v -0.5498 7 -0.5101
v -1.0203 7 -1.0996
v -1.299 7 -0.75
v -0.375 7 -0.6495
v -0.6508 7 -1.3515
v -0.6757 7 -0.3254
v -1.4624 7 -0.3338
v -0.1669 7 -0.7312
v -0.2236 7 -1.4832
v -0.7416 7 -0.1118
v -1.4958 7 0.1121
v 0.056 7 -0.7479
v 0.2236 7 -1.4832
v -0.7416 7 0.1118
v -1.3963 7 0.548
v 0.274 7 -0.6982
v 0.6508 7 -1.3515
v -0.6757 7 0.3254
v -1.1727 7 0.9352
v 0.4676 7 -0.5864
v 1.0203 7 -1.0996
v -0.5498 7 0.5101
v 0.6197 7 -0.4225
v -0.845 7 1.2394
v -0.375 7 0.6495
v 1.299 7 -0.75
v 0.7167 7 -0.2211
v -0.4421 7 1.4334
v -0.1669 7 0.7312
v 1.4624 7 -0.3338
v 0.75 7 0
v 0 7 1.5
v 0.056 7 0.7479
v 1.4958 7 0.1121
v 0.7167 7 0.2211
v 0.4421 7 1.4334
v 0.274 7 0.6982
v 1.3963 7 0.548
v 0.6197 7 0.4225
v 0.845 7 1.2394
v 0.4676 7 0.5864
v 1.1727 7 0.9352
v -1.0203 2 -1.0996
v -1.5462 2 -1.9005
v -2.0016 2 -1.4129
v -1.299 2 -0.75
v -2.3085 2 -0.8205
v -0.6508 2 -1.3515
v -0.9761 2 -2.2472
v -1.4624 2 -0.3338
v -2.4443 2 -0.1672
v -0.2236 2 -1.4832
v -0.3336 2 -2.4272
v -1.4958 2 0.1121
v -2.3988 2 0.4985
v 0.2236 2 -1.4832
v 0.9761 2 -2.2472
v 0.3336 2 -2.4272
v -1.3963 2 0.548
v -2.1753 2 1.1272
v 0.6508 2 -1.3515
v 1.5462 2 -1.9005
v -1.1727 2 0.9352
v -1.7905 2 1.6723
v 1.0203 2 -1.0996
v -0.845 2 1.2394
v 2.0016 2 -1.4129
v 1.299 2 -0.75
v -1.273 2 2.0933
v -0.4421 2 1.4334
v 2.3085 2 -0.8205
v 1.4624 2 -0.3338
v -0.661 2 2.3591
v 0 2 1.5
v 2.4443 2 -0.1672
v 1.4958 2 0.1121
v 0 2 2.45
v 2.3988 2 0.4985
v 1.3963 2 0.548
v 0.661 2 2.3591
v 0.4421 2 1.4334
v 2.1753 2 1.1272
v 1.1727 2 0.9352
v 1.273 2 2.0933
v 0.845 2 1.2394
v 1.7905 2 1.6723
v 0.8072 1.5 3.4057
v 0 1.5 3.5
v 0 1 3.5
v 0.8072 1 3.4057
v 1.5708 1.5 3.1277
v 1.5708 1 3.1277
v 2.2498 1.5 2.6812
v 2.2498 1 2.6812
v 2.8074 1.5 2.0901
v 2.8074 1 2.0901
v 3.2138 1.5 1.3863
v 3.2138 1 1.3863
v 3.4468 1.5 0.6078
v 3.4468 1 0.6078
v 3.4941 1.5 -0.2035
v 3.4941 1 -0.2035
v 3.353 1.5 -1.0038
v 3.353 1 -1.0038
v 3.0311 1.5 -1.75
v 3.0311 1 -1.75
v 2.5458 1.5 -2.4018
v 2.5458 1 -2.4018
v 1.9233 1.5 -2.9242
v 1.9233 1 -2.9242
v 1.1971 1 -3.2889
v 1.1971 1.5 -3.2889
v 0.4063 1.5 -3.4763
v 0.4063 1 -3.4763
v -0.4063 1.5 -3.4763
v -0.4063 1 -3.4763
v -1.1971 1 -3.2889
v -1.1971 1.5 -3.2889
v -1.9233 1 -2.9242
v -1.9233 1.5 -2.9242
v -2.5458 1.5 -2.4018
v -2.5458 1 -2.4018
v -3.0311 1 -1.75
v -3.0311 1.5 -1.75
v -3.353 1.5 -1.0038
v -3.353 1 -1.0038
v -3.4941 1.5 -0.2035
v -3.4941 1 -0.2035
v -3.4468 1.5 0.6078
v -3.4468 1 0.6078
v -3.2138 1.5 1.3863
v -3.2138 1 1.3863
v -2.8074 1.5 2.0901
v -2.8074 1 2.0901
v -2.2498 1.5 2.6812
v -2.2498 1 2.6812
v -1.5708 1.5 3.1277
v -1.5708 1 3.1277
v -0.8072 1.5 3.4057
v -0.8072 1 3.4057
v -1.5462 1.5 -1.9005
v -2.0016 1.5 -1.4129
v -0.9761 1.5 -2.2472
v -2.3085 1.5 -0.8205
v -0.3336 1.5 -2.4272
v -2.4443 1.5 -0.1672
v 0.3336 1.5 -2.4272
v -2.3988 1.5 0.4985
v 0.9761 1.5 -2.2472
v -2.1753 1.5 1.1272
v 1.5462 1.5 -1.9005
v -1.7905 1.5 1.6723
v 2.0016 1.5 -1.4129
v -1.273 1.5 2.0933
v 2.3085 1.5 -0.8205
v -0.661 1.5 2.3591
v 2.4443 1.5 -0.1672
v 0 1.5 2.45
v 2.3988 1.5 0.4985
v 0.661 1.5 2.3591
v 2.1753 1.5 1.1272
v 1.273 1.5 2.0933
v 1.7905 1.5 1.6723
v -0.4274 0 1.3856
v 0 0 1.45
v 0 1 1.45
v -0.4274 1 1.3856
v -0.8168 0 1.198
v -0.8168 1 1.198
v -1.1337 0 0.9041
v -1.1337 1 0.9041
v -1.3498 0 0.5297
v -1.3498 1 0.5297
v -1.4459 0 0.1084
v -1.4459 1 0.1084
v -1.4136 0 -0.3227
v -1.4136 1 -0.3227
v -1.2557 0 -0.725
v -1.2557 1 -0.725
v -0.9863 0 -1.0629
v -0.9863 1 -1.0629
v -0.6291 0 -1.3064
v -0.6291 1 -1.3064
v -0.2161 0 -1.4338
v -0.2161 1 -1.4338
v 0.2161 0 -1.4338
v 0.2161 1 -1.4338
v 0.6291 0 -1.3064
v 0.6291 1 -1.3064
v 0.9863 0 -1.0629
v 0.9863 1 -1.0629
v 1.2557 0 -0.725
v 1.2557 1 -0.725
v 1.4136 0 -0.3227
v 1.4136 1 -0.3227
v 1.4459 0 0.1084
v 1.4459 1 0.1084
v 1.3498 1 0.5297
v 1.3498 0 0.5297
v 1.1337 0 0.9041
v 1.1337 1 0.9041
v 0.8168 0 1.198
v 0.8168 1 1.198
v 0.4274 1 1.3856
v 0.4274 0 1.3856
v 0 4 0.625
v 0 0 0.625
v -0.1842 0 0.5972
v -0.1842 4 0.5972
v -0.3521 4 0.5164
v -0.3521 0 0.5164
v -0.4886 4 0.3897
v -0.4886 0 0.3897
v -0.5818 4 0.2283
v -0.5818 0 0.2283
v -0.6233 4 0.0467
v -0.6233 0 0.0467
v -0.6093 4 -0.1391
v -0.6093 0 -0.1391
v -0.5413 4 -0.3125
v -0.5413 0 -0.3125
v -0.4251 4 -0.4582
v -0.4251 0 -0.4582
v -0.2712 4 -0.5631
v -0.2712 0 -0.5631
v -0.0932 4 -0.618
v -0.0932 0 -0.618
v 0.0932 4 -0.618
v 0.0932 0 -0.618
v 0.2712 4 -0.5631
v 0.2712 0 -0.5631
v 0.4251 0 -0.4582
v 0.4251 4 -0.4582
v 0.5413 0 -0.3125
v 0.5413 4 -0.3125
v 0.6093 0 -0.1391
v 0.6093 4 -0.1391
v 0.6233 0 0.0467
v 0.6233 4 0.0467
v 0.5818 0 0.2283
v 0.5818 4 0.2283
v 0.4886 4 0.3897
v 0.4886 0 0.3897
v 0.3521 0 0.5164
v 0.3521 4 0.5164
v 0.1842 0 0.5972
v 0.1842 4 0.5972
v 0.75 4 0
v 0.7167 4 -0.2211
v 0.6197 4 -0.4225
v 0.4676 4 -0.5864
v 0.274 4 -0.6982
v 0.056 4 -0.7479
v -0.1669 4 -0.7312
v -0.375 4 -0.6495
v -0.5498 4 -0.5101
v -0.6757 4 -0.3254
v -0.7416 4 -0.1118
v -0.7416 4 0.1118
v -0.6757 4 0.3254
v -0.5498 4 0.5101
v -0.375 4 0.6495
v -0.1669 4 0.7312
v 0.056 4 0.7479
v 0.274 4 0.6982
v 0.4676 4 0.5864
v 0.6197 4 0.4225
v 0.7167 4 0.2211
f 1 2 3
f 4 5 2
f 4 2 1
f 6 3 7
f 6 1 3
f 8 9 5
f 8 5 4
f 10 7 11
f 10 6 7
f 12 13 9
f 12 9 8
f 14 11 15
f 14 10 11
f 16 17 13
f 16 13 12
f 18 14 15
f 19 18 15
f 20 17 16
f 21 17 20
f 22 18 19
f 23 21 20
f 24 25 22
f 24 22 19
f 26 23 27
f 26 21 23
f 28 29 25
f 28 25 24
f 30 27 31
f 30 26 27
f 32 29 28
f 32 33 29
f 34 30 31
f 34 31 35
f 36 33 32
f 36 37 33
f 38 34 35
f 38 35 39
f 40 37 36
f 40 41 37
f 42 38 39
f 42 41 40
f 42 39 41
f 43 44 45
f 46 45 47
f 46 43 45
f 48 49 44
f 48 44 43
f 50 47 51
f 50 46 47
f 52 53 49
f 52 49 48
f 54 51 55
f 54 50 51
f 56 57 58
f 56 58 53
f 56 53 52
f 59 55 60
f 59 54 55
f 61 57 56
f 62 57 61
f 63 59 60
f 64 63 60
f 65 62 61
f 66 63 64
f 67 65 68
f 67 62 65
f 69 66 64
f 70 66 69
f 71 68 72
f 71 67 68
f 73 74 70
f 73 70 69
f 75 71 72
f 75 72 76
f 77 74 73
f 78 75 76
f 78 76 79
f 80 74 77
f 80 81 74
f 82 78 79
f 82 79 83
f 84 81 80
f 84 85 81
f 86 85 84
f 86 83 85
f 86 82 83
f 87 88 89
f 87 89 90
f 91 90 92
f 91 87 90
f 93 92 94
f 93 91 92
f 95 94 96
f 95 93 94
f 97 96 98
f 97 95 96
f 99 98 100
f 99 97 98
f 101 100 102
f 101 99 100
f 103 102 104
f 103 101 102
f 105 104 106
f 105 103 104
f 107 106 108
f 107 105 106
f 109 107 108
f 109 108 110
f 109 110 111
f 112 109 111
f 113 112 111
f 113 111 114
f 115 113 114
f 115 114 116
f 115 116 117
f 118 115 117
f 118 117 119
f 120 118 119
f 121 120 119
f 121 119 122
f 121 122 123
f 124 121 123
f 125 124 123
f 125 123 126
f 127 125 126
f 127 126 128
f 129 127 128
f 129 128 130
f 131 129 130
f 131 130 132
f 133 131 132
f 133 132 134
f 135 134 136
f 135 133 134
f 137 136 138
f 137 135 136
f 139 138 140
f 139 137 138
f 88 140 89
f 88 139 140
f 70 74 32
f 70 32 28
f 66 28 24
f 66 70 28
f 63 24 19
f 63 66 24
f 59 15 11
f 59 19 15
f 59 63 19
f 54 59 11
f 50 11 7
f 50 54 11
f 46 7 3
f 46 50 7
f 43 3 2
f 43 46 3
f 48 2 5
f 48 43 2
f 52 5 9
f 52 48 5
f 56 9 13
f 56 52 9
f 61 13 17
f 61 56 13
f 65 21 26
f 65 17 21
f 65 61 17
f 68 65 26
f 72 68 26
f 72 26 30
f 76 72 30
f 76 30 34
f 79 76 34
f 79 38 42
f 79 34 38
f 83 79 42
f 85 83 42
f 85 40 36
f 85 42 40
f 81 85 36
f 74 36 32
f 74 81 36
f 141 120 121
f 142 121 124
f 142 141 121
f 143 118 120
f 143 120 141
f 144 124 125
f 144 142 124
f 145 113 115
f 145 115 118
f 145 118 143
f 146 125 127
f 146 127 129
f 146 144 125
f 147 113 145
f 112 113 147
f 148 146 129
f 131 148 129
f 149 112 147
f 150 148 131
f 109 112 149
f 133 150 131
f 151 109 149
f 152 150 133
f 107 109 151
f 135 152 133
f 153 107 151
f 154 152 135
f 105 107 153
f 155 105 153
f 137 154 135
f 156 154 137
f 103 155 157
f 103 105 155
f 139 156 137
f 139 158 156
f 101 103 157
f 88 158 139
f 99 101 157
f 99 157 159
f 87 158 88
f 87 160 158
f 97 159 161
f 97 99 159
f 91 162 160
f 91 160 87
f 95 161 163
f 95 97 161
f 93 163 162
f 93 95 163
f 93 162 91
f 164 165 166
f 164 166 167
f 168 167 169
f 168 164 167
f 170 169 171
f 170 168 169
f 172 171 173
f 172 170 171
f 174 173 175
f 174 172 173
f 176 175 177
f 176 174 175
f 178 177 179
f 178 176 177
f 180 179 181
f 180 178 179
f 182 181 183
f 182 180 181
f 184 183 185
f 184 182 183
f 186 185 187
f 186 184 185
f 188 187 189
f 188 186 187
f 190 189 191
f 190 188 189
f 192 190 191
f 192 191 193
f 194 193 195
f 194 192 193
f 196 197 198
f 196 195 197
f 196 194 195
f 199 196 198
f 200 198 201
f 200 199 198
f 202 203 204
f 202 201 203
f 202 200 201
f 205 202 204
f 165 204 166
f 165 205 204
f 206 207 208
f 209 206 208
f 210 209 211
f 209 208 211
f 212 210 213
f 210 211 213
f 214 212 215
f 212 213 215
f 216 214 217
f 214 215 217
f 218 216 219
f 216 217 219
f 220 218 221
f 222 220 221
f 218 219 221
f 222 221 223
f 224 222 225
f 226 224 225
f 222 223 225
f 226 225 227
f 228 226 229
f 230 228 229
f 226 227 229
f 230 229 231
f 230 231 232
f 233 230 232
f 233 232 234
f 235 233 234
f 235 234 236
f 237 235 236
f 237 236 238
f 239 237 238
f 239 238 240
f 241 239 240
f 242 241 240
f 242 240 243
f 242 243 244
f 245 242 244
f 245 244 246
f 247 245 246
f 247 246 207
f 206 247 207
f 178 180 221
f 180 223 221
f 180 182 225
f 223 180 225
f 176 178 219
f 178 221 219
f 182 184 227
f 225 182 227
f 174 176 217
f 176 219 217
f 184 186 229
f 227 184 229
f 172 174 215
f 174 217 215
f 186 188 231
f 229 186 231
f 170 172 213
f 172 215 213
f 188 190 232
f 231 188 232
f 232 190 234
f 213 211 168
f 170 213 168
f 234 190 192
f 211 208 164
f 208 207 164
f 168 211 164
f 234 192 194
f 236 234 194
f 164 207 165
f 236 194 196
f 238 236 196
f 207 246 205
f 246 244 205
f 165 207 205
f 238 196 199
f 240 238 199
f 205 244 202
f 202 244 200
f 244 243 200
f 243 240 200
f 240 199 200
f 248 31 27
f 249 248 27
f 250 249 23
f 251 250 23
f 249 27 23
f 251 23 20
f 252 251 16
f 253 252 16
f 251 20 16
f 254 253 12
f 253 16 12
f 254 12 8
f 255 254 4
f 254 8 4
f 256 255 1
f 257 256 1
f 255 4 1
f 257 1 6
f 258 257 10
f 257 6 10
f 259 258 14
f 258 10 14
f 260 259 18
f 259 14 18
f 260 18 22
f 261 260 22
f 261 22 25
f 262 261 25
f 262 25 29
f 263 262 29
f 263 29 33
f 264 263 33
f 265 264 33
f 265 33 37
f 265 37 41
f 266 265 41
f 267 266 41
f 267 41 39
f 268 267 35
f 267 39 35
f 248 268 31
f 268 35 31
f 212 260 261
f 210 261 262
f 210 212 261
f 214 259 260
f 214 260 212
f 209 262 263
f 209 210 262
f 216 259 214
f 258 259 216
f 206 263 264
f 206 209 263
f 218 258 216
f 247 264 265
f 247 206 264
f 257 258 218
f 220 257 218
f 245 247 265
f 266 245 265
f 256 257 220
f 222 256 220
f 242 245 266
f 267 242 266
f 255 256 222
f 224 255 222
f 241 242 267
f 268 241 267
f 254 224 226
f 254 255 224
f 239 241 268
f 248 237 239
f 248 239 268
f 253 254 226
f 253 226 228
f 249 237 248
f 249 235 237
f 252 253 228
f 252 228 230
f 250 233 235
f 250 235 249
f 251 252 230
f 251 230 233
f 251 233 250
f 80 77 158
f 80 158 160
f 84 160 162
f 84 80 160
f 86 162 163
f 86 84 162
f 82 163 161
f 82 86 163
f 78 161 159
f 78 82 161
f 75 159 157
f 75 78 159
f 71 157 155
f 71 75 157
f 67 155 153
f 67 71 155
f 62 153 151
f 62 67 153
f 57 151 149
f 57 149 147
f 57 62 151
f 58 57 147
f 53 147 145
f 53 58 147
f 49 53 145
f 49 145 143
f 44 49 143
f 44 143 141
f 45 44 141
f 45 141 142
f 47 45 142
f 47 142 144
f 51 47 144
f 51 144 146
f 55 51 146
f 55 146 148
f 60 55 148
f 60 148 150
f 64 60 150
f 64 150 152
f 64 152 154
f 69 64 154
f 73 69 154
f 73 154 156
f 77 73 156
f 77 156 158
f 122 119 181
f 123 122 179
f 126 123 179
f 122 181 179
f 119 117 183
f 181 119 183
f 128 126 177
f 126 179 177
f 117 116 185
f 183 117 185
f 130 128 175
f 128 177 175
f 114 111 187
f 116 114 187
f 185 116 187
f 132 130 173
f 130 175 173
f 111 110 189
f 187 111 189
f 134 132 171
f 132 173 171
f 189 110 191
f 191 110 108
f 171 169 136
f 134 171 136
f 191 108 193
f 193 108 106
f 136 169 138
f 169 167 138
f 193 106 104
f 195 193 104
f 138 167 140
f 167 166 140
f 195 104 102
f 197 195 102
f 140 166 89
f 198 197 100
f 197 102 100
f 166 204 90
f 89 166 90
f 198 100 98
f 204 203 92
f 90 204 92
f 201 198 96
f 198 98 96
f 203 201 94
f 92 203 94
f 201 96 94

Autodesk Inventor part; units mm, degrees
ref_plane "YZ Plane" through (0, 0, 0) normal (1, 0, 0) x (0, 1, 0)
ref_plane "XZ Plane" through (0, 0, 0) normal (0, 1, 0) x (-1, 0, 0)
ref_plane "XY Plane" through (0, 0, 0) normal (0, 0, 1) x (1, 0, 0)
sketch "Sketch1" plane through (0, 0, 0) normal (1, 0, 0) x (0, 1, 0)
  line L0 (7, 0.625) -> (0, 0.625)
  line L1 (1, 1.45) -> (1, 3.5)
  line L2 (2, 2.45) -> (2, 1.5)
  line L3 (7, 1.5) -> (7, 0.625)
  line L4 (-1.4, 0) -> (8.4, 0) projected
  line L5 (1.5, 2.45) -> (2, 2.45)
  line L6 (1, 3.5) -> (1.5, 3.5)
  line L7 (1.5, 3.5) -> (1.5, 2.45)
  line L8 (1, 1.45) -> (0, 1.45)
  line L9 (0, 1.45) -> (0, 0.625)
  line L10 (7, 1.5) -> (2, 1.5)
  point P0 (0, 0)
  dimension "d0" = 7
  dimension "d1" = 0.625
  dimension "d8" = 2.45
  dimension "d10" = 0.5
  dimension "d11" = 0.5
  dimension "d13" = 3.5
  dimension "d16" = 1
  dimension "d31" = 1.45
  dimension "d32" = 1.5
revolve "Revolution1" add sketch "Sketch1" angle 360 about axis through (0, -10, 0) along (0, 1, 0)
sketch "Sketch5" plane through (0, 7, 0) normal (0, 1, 0) x (1, 0, 0)
  circle A0 centre (0, 0) radius 0.75
  dimension "d28" = 1.5
extrude "Extrusion2" cut sketch "Sketch5" against normal blind 3
properties part number "TorsOsc-202511-cell-tower" material "Epoxy Resin"
